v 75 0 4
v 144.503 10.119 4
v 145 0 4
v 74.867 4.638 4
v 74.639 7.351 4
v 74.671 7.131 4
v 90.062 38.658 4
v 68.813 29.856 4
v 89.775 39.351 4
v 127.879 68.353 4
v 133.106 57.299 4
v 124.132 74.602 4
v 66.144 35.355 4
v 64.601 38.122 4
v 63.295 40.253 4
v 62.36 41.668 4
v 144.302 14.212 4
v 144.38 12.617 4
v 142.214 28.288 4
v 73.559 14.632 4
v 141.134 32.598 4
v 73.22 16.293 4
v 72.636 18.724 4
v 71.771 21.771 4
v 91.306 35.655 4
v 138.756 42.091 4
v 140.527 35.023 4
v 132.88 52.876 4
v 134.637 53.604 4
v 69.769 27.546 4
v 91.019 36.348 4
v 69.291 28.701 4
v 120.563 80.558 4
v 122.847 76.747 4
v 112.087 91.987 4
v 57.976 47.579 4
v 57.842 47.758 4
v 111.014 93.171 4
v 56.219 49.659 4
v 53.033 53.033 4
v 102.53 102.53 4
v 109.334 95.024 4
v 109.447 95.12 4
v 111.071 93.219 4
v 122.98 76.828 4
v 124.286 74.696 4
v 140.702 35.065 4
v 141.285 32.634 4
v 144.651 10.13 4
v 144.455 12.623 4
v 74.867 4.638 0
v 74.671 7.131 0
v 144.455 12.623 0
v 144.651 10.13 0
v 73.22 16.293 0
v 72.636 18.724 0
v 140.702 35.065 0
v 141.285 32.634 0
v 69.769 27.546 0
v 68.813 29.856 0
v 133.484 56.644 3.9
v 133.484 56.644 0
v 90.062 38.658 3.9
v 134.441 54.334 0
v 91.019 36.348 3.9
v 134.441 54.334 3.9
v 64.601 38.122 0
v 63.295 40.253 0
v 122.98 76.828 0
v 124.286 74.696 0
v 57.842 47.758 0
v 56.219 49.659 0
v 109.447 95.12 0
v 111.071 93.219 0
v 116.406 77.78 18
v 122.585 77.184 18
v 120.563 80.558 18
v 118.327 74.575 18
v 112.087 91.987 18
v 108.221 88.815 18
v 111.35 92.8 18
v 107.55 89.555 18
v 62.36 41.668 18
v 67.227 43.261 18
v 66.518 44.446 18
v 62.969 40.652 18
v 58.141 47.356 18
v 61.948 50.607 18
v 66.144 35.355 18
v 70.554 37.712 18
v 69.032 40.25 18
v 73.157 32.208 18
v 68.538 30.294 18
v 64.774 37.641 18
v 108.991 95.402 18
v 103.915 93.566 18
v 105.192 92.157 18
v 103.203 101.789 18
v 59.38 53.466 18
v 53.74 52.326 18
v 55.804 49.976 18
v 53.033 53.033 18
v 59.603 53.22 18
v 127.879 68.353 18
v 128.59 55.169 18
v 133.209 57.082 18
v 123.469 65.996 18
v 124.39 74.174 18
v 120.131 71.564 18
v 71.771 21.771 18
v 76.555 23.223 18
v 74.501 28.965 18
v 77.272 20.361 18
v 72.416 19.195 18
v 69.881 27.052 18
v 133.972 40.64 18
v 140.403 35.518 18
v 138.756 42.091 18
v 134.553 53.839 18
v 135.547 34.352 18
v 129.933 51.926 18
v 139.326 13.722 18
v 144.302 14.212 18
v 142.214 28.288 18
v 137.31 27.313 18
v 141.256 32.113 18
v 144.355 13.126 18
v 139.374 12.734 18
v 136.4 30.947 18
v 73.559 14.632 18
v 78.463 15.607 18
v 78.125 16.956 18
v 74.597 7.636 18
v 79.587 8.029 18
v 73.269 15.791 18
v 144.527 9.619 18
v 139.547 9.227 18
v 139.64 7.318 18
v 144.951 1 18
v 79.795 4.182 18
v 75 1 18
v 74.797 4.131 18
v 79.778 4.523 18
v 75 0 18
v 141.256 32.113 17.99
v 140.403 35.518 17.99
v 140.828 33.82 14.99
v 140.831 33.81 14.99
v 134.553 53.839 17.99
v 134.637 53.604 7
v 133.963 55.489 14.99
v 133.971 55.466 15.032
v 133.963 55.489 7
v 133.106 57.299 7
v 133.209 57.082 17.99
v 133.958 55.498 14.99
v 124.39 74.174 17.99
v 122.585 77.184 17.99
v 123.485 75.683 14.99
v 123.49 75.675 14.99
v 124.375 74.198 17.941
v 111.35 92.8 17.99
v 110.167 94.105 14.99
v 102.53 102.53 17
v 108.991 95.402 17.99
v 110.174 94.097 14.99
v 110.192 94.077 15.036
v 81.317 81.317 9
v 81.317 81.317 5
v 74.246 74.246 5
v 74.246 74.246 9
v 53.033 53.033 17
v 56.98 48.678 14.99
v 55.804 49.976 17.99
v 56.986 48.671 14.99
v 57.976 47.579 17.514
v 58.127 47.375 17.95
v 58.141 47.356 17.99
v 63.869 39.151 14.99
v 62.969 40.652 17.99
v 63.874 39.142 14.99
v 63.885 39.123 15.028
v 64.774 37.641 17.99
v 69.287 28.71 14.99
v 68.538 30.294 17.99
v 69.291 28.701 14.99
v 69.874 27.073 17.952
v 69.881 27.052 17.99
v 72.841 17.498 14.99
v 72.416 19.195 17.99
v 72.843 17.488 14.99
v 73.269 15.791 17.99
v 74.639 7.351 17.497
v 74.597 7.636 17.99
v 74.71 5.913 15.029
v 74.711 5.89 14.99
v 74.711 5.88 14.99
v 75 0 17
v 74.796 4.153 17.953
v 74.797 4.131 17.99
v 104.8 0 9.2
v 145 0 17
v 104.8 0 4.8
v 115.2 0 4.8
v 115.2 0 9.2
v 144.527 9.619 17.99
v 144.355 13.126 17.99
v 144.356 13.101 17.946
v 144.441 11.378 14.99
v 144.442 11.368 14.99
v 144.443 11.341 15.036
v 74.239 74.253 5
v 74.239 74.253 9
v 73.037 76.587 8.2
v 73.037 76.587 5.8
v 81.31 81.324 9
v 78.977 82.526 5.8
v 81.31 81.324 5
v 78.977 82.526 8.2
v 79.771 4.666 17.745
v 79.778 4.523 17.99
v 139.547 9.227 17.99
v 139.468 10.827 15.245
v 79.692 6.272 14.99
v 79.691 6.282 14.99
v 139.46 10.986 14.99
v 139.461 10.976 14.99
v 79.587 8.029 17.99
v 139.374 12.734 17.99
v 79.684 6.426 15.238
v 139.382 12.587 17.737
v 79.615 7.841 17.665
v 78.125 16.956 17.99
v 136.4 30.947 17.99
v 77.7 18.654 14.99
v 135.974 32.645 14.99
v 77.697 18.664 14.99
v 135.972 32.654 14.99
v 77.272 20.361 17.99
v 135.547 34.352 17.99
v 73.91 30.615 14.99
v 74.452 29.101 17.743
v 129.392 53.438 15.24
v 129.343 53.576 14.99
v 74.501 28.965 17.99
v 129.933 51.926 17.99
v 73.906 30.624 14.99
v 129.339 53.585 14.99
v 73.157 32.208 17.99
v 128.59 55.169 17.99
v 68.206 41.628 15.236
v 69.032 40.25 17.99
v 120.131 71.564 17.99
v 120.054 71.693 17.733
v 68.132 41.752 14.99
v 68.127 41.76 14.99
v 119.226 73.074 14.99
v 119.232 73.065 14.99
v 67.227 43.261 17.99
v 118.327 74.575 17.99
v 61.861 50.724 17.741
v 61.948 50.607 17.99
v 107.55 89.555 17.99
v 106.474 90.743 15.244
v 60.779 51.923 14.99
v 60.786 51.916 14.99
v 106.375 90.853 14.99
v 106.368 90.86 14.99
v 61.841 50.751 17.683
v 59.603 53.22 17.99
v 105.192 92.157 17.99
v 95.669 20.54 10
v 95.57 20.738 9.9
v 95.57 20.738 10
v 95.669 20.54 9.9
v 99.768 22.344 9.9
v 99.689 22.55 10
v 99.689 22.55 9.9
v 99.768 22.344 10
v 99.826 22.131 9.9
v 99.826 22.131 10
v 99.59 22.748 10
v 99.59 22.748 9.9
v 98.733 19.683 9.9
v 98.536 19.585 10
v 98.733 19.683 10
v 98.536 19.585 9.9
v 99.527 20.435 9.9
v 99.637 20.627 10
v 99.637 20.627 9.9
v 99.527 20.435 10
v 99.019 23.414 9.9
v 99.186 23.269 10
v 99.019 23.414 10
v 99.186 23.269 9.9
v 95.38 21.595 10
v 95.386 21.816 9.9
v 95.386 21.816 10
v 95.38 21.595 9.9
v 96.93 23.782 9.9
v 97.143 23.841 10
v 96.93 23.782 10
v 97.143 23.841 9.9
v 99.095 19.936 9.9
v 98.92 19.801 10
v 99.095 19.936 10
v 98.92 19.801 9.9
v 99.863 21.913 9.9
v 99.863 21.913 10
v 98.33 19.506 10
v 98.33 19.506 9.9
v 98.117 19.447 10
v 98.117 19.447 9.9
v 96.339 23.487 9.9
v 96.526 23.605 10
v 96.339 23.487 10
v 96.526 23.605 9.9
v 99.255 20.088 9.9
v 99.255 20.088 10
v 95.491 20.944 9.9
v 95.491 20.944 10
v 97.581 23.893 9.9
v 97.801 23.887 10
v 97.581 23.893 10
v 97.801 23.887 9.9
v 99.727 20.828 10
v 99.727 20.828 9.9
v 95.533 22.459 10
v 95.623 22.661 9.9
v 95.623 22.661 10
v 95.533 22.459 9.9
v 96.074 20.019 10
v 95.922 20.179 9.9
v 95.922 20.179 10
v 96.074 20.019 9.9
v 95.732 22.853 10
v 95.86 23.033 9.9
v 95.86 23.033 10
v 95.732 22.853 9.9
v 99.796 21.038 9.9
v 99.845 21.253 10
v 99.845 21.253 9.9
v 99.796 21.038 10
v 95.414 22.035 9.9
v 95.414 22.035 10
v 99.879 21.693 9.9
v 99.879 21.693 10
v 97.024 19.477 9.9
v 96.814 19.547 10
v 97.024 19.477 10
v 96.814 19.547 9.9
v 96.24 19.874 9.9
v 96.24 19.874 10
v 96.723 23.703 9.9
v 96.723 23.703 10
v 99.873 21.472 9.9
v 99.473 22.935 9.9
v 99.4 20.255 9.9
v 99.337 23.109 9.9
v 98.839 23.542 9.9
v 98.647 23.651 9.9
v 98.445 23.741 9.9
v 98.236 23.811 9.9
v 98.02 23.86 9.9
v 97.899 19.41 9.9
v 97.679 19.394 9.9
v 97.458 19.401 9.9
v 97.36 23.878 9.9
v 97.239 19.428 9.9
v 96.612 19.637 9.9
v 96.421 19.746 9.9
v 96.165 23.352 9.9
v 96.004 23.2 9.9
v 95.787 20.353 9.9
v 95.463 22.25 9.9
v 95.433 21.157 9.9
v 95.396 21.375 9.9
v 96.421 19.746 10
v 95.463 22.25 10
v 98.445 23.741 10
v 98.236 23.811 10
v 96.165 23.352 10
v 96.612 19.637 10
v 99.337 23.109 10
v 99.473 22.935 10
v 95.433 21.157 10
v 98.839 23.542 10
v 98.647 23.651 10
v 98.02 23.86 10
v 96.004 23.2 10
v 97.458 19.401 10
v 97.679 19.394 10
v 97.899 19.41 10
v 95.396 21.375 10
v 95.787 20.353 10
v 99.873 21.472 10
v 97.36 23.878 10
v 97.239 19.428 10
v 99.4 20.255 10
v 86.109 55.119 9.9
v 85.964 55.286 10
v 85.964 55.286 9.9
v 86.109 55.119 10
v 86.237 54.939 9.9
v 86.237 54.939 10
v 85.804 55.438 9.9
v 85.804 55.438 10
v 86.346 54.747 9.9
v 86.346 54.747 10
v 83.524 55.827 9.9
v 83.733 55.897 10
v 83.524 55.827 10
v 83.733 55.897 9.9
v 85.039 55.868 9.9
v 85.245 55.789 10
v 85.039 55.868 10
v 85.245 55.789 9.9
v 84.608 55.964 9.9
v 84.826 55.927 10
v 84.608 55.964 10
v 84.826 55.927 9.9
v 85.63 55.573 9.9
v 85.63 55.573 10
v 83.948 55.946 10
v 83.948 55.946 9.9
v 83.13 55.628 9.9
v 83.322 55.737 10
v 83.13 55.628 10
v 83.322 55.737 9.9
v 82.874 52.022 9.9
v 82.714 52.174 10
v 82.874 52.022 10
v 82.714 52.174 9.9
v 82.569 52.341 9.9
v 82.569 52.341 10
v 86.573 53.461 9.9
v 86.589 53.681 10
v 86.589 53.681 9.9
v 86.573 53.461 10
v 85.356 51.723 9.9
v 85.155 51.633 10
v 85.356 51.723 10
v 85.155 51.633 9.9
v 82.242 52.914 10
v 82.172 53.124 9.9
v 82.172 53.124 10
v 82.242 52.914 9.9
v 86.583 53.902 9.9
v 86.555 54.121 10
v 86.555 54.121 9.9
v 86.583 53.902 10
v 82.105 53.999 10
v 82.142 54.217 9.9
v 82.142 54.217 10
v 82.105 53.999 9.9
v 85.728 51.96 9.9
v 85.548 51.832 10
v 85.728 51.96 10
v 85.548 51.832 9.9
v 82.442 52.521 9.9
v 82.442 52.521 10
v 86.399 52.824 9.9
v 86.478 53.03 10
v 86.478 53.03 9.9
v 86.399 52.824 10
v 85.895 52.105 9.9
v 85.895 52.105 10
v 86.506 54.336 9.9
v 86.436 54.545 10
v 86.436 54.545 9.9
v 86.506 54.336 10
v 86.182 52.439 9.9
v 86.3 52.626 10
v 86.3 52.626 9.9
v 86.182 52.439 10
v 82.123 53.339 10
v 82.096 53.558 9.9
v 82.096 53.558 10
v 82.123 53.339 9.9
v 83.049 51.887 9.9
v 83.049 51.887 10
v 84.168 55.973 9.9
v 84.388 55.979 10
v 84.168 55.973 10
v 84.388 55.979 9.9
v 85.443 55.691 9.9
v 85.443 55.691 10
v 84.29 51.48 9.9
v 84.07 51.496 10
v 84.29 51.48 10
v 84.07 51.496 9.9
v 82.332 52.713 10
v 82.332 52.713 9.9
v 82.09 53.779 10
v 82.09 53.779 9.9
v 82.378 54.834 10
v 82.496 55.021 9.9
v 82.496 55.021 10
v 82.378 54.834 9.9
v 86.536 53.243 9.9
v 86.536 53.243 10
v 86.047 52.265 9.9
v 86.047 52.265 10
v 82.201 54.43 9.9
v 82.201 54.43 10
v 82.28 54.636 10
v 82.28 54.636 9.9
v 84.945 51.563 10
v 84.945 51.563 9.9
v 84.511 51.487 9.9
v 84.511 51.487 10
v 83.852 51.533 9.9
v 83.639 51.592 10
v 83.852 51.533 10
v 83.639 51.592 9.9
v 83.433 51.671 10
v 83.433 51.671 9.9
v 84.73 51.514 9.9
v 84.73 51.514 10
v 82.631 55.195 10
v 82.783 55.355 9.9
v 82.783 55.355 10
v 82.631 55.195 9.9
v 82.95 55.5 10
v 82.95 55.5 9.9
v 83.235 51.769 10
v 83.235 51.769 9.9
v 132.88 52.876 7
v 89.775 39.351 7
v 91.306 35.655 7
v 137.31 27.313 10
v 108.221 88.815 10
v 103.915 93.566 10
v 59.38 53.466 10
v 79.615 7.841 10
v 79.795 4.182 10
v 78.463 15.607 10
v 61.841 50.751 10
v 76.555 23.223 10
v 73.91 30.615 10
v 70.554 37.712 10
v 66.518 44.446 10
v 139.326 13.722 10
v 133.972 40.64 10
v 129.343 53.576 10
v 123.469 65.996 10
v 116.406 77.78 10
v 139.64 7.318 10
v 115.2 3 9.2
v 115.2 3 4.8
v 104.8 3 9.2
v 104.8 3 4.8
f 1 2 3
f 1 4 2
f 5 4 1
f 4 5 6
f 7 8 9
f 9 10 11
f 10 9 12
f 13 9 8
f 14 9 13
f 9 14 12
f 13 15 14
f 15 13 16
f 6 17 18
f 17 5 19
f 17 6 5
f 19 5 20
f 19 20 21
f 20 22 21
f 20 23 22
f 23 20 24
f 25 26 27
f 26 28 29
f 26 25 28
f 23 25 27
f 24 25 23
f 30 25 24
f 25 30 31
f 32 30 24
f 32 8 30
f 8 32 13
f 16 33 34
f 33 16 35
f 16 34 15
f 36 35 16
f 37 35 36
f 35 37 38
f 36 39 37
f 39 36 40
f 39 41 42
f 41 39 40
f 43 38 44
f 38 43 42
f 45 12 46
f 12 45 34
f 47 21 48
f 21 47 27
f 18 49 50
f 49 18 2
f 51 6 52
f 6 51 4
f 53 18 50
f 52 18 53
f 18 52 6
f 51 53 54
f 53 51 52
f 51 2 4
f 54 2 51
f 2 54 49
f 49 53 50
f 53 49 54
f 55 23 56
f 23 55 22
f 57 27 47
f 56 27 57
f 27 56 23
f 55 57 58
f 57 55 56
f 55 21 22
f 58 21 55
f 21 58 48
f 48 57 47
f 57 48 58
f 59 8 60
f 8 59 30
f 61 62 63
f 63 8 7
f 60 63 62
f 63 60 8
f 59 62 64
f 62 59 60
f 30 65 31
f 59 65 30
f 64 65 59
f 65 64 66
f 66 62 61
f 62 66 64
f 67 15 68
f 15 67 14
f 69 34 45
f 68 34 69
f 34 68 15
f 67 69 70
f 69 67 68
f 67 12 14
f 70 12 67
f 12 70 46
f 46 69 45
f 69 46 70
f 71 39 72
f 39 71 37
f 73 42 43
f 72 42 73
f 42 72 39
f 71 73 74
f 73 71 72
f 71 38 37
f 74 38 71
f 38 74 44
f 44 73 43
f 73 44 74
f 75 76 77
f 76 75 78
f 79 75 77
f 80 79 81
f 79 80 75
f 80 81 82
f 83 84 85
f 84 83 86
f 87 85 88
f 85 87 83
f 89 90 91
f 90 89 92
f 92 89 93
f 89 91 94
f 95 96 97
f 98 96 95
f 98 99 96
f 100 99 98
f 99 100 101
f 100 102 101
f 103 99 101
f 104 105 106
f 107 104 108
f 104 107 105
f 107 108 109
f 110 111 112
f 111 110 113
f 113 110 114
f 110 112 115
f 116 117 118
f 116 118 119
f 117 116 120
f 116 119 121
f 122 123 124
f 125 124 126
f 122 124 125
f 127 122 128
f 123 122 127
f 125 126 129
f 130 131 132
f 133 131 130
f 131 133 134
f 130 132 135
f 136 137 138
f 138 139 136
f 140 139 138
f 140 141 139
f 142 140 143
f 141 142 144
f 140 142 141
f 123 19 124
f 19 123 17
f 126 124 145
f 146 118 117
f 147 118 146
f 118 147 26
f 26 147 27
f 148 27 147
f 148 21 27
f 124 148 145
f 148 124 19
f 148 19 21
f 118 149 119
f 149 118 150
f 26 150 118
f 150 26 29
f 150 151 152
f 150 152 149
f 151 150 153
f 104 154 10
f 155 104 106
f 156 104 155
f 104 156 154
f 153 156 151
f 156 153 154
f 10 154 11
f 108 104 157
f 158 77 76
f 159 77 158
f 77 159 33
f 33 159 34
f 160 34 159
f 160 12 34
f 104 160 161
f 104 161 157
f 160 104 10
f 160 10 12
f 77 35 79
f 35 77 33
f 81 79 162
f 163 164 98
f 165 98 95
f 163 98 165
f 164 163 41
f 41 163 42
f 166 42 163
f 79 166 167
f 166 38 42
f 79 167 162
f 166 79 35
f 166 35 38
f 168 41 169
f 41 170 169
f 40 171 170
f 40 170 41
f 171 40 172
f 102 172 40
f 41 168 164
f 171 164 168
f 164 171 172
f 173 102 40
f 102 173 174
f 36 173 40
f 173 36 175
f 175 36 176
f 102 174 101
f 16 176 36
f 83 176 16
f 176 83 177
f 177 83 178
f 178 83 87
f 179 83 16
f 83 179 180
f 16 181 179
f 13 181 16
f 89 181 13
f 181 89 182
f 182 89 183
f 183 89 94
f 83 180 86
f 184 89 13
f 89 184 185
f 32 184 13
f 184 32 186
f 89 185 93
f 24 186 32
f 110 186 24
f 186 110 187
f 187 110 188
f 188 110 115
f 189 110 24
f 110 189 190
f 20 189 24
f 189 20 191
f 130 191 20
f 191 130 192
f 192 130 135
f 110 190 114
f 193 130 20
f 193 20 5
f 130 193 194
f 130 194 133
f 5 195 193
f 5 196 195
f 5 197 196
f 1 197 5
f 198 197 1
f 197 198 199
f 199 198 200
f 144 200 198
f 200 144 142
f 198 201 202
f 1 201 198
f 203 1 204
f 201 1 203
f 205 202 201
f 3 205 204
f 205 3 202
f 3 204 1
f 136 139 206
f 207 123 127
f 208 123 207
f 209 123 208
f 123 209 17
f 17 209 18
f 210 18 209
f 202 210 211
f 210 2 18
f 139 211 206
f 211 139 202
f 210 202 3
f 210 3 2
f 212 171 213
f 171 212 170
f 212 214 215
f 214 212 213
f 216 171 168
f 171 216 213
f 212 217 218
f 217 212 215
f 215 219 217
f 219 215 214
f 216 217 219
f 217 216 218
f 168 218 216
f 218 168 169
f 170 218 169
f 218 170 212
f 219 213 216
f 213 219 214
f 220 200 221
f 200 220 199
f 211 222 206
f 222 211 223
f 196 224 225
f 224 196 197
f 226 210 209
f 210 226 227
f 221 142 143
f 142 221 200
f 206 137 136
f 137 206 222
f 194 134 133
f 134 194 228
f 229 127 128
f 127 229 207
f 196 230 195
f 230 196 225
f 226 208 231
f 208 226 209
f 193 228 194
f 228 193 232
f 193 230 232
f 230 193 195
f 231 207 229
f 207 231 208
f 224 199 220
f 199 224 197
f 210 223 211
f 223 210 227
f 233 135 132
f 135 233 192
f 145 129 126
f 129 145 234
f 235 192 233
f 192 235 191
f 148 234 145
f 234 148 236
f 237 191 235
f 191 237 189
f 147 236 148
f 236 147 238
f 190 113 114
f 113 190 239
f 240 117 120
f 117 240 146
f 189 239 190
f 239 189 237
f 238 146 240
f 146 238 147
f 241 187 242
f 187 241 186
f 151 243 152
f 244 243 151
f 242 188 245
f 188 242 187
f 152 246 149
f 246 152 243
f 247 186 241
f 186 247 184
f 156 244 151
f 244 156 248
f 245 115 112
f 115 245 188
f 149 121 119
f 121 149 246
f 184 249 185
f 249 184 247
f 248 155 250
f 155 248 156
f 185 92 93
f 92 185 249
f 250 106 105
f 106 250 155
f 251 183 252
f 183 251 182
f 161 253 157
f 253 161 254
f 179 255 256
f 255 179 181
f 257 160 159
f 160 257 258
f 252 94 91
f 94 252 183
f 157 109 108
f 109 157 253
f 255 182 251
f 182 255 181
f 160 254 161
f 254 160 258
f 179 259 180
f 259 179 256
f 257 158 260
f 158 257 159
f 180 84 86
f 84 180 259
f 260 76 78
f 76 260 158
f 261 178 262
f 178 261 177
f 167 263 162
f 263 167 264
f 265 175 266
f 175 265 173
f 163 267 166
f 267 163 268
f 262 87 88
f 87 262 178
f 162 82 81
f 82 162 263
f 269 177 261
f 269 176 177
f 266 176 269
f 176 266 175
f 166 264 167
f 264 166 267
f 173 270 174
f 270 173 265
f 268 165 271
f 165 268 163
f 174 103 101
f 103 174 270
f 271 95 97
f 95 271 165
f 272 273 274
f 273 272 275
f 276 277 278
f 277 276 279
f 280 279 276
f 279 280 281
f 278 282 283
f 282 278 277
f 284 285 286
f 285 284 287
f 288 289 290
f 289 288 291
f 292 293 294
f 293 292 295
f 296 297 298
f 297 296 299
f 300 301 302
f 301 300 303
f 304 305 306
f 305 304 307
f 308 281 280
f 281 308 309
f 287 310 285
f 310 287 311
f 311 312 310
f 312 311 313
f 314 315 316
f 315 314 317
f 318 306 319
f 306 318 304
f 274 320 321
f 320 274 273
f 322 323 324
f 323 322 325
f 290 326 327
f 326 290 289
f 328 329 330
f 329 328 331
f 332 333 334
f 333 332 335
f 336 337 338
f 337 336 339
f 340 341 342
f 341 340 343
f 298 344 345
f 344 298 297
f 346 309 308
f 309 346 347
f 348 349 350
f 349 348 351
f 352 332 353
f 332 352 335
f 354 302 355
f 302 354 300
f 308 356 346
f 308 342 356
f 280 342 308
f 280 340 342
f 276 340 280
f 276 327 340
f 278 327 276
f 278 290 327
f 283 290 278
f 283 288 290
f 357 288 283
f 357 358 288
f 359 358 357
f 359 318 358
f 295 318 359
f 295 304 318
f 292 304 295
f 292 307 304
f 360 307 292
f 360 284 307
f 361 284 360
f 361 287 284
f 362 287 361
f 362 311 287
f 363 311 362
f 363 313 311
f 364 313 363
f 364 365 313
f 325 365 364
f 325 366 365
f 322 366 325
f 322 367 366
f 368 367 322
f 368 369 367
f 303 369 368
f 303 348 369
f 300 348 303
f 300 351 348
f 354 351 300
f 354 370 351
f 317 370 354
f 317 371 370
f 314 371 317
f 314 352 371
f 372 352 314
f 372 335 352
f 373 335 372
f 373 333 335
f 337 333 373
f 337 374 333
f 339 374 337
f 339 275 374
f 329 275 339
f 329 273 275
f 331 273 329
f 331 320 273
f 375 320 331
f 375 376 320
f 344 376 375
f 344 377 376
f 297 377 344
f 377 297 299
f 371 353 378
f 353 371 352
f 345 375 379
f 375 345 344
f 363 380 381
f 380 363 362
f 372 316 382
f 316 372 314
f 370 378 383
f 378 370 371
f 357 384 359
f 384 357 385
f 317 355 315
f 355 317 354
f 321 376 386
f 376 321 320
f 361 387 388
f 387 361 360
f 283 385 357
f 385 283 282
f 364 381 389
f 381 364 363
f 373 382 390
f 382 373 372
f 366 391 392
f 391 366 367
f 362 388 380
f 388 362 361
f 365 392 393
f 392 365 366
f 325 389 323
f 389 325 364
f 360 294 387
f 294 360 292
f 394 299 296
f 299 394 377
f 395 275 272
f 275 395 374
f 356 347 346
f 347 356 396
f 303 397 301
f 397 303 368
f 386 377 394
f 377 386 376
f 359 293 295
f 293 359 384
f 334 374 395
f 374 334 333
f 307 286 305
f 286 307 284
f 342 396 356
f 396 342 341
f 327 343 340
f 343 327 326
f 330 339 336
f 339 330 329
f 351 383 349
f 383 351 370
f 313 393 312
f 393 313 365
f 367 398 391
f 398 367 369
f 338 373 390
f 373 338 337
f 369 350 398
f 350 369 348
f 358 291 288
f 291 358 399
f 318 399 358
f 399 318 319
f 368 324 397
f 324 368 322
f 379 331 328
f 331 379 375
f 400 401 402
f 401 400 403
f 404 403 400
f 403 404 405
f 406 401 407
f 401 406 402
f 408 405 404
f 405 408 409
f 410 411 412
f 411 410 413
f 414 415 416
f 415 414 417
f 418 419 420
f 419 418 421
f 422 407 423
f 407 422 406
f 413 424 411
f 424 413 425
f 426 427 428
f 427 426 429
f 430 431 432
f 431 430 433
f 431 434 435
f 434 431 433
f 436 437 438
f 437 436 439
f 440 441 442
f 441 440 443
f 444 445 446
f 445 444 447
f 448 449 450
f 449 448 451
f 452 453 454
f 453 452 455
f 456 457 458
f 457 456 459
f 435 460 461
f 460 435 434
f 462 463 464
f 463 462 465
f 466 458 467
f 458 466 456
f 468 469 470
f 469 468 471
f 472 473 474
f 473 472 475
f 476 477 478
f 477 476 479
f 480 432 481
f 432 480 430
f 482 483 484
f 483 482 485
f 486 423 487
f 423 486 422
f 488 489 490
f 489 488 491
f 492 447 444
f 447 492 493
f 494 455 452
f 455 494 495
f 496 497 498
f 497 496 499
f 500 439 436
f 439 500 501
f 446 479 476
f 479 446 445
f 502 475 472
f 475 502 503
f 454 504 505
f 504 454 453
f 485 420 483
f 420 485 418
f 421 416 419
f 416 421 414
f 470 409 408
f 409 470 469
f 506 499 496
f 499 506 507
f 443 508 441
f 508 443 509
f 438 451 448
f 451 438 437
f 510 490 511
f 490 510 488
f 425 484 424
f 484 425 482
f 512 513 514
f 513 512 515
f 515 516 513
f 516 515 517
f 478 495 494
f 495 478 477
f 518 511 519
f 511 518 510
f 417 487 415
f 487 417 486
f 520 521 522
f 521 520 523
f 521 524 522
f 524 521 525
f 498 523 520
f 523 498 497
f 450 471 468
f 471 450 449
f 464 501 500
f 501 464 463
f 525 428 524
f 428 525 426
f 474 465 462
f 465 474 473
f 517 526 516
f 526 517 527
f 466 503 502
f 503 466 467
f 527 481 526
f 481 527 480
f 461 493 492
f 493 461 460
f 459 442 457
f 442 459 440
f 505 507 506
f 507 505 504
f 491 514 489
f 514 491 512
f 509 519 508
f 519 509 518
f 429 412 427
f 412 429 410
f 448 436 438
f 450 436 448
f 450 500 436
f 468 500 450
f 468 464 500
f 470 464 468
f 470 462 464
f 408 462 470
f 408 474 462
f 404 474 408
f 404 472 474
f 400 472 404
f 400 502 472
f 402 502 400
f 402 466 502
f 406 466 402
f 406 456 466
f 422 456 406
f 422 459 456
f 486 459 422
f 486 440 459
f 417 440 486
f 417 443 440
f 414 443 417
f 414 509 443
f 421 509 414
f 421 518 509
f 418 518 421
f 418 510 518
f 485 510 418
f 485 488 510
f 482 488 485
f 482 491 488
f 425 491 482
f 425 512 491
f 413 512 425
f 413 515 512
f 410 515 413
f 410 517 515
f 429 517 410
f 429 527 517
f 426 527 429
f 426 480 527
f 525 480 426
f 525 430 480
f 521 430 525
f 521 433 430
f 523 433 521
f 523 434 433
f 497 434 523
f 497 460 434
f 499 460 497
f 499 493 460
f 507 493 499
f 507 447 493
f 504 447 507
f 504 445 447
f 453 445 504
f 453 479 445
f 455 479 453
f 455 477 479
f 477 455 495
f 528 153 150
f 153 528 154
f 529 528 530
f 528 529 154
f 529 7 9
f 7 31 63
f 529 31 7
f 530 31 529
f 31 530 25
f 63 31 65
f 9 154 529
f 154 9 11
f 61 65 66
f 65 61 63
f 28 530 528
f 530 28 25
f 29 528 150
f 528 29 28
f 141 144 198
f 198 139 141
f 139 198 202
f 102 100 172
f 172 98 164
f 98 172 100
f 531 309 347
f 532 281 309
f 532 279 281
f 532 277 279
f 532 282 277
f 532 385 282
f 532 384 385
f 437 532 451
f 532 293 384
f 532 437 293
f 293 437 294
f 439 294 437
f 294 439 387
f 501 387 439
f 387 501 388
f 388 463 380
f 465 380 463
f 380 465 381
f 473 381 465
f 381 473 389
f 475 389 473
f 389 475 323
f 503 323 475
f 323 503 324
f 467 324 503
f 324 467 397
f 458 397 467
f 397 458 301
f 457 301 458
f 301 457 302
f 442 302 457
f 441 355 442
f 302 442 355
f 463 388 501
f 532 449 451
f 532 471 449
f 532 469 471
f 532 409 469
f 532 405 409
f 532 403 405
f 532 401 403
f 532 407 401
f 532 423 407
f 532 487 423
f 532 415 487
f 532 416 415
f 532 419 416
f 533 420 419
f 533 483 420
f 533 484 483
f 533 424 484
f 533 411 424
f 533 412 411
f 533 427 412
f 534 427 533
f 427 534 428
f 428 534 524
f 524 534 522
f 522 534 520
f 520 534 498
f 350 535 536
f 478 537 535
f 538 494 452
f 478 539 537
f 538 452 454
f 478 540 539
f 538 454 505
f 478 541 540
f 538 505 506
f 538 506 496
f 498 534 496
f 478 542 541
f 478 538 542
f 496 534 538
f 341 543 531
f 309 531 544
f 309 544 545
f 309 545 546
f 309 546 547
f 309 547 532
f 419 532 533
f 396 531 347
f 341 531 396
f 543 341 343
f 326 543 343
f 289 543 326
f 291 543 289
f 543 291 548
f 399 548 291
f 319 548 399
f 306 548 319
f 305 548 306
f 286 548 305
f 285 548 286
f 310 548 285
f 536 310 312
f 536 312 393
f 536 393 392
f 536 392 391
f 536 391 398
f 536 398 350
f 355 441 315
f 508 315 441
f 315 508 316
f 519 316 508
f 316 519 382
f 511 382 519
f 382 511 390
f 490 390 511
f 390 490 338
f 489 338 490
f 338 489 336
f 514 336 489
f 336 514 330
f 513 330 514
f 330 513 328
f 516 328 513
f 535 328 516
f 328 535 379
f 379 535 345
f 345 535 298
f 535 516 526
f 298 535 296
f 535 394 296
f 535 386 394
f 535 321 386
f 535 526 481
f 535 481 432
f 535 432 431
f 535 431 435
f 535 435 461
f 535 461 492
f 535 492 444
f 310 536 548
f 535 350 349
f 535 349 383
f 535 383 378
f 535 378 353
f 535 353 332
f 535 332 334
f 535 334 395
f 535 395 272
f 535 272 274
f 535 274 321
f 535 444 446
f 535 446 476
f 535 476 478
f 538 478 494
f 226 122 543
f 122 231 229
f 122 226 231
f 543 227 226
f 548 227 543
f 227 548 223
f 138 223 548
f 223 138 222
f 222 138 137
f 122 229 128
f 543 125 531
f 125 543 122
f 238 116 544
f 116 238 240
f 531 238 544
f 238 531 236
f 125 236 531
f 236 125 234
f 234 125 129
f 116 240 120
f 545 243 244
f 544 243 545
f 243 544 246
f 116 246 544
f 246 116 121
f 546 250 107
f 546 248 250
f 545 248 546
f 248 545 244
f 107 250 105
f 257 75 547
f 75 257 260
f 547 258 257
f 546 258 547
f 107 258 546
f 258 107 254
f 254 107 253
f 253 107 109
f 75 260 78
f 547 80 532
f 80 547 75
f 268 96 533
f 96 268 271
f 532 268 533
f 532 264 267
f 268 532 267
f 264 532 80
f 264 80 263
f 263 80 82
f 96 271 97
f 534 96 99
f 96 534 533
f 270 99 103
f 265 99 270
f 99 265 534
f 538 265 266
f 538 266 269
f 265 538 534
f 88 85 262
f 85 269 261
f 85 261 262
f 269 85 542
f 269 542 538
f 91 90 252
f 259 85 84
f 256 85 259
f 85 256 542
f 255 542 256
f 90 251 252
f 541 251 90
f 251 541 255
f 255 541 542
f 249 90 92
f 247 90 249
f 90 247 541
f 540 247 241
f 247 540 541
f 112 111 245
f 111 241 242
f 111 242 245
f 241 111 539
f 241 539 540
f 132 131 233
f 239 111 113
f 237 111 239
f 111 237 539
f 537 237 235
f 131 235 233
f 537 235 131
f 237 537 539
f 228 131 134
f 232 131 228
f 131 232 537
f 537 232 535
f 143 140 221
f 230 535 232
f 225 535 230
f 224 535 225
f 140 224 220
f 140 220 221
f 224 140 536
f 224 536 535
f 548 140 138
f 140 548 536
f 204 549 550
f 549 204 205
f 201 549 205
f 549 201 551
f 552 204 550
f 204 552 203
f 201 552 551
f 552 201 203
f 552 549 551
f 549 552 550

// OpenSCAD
// ═══════════════════════════════════════════════════════════════════════
//  CowPad — Sensor Tile  ·  Demo Model
//  Arc Tile with EC probe holes + wire channel for Arduino demo
//
//  ► PRINT 1 COPY
//  ► Orientation : flat face DOWN (ribs on build plate)
//  ► Layer height : 0.2mm
//  ► Infill       : 20% gyroid
//  ► Supports     : NONE
//  ► Material     : PLA
//  ► Est. time    : ~2 hr
//
//  EC SENSOR ASSEMBLY:
//    1. Insert steel nail probes through holes (push from above)
//    2. Thread wires through bottom channel out to tile edge
//    3. Connect to Arduino Nano (see PRODUCT.md circuit diagram)
//    4. Insert biochar cartridge (with real biochar)
//    5. Pour water/salt solution → LED turns green → yellow → red
//
//  Probe spacing: ~20mm (circumferential)
//  Probe diameter: 4.5mm hole (fits 3–4mm nail)
// ═══════════════════════════════════════════════════════════════════════

$fn = 64;

// ── Parameters (must match cowpad_tile_arc.scad) ──────────────────────
IR = 75;
OR = 145;
ANG = 45;
FILL_H = 8;
BASE_H = 6;
H      = BASE_H + FILL_H;
RIB_H  = 4;
N_CH   = 5;
CH_W   = 3.5;
CH_D   = 3.0;   // V-groove depth (was 2.2)
LID_H  = 1.5;
LID_D  = 4.0;
CHAM   = 1.0;
N_RIB  = 5;
RIB_W  = 2.5;
CAV_WALL = 5;
CAV_ANG  = 3;
SN_W    = 10;
SN_H    = 4;
SN_L    = 2.5;
SN_CHAM = 0.8;
SN_POS  = (IR + OR) / 2;

// ── Sensor-specific ───────────────────────────────────────────────────
PROBE_D    = 4.5;   // probe hole diameter (mm)
PROBE_R    = (IR + OR) / 2 - 10;  // radial position (slightly inward)
PROBE_SEP  = 10;    // half-separation angle (degrees) → ~20mm arc apart
WIRE_W     = 4;     // wire channel width
WIRE_H     = 3;     // wire channel height
WIRE_ANG   = ANG / 2;  // wire channel runs along mid-arc

// ═══════════════════════════════════════════════════════════════════════
// HELPERS (identical to arc tile)
// ═══════════════════════════════════════════════════════════════════════

module pie_2d(r, a1, a2) {
  steps = max(4, ceil(a2 - a1));
  pts = concat([[0, 0]],
    [for (i = [0:steps])
      [r * cos(a1 + i*(a2-a1)/steps),
       r * sin(a1 + i*(a2-a1)/steps)]]);
  polygon(pts);
}

module ring_sector_2d(ri, ro, a1, a2) {
  intersection() {
    difference() { circle(ro); circle(ri); }
    pie_2d(ro + 1, a1, a2);
  }
}

module ring_sector(ri, ro, a1, a2, h) {
  linear_extrude(h) ring_sector_2d(ri, ro, a1, a2);
}

module snap_tab() {
  rotate([0, 0, ANG]) {
    translate([SN_POS - SN_W/2, 0, BASE_H/2 - SN_H/2])
      hull() {
        cube([SN_W, 0.01, SN_H]);
        translate([SN_CHAM, SN_L, SN_CHAM])
          cube([SN_W - 2*SN_CHAM, 0.01, SN_H - 2*SN_CHAM]);
      }
  }
}

module snap_slot_cut() {
  translate([SN_POS - SN_W/2 - 0.2, 0, BASE_H/2 - SN_H/2 - 0.2])
    cube([SN_W + 0.4, SN_L + 0.5, SN_H + 0.4]);
}

module cavity_cut() {
  translate([0, 0, BASE_H])
    ring_sector(IR + CAV_WALL, OR - CAV_WALL,
                CAV_ANG, ANG - CAV_ANG,
                FILL_H + 0.1);
}

module channel_cuts() {
  for (i = [0:N_CH-1]) {
    a = (i + 0.5) * ANG / N_CH;
    rotate([0, 0, a])
      translate([IR - 1, 0, H - CH_D - 0.01])
        hull() {
          cube([OR - IR + 2, 0.01, 0.01]);
          translate([0, -CH_W/2, CH_D]) cube([OR - IR + 2, 0.01, 0.01]);
          translate([0,  CH_W/2, CH_D]) cube([OR - IR + 2, 0.01, 0.01]);
        }
  }
}

module edge_chamfers() {
  for (a = [0, ANG]) {
    rotate([0, 0, a])
      translate([IR, 0, H - CHAM])
        rotate([45, 0, 0])
          cube([OR - IR, CHAM * 1.5, CHAM * 1.5]);
  }
}

module ribs() {
  for (i = [0:N_RIB-1]) {
    a = (i + 0.5) * ANG / N_RIB;
    rotate([0, 0, a])
      translate([IR, -RIB_W/2, -RIB_H])
        cube([OR - IR, RIB_W, RIB_H]);
  }
}

// ═══════════════════════════════════════════════════════════════════════
// SENSOR FEATURES
// ═══════════════════════════════════════════════════════════════════════

// Two probe holes through fill + lid only — stops at structural base (does NOT
// punch through tile bottom).  Nail tips sit at base level, deep in biochar.
// Rain wets top of biochar; probes measure from the bottom → rain-stable signal.
module probe_holes() {
  for (a = [WIRE_ANG - PROBE_SEP, WIRE_ANG + PROBE_SEP]) {
    rotate([0, 0, a])
      translate([PROBE_R, 0, BASE_H - 0.1])
        cylinder(d = PROBE_D, h = FILL_H + 0.2);
  }
}

// Pull-tab slot through lid (matches arc tile — same cavity, same cartridge)
module pull_tab_slot() {
  rotate([0, 0, ANG / 2])
    translate([(IR + OR) / 2 - 8, -2.5, H - LID_H - 0.1])
      cube([16, 5, LID_H + 0.2]);
}

// Wire channel on bottom face — runs radially from probe zone to outer edge
// Wires exit through the outer curved wall and connect to Arduino
module wire_channel_cut() {
  rotate([0, 0, WIRE_ANG])
    translate([PROBE_R - 2, -WIRE_W/2, -0.1])
      cube([OR - PROBE_R + 4, WIRE_W, WIRE_H + 0.1]);
  // Exit hole through outer wall
  rotate([0, 0, WIRE_ANG])
    translate([OR - 2, -WIRE_W/2, 0])
      cube([10, WIRE_W, WIRE_H]);
}

// ═══════════════════════════════════════════════════════════════════════
// ASSEMBLE
// ═══════════════════════════════════════════════════════════════════════

translate([0, 0, RIB_H]) {
  difference() {
    union() {
      ring_sector(IR, OR, 0, ANG, H);
      ribs();
      snap_tab();
    }
    cavity_cut();
    channel_cuts();
    pull_tab_slot();
    snap_slot_cut();
    probe_holes();
    wire_channel_cut();
    edge_chamfers();
  }
}
